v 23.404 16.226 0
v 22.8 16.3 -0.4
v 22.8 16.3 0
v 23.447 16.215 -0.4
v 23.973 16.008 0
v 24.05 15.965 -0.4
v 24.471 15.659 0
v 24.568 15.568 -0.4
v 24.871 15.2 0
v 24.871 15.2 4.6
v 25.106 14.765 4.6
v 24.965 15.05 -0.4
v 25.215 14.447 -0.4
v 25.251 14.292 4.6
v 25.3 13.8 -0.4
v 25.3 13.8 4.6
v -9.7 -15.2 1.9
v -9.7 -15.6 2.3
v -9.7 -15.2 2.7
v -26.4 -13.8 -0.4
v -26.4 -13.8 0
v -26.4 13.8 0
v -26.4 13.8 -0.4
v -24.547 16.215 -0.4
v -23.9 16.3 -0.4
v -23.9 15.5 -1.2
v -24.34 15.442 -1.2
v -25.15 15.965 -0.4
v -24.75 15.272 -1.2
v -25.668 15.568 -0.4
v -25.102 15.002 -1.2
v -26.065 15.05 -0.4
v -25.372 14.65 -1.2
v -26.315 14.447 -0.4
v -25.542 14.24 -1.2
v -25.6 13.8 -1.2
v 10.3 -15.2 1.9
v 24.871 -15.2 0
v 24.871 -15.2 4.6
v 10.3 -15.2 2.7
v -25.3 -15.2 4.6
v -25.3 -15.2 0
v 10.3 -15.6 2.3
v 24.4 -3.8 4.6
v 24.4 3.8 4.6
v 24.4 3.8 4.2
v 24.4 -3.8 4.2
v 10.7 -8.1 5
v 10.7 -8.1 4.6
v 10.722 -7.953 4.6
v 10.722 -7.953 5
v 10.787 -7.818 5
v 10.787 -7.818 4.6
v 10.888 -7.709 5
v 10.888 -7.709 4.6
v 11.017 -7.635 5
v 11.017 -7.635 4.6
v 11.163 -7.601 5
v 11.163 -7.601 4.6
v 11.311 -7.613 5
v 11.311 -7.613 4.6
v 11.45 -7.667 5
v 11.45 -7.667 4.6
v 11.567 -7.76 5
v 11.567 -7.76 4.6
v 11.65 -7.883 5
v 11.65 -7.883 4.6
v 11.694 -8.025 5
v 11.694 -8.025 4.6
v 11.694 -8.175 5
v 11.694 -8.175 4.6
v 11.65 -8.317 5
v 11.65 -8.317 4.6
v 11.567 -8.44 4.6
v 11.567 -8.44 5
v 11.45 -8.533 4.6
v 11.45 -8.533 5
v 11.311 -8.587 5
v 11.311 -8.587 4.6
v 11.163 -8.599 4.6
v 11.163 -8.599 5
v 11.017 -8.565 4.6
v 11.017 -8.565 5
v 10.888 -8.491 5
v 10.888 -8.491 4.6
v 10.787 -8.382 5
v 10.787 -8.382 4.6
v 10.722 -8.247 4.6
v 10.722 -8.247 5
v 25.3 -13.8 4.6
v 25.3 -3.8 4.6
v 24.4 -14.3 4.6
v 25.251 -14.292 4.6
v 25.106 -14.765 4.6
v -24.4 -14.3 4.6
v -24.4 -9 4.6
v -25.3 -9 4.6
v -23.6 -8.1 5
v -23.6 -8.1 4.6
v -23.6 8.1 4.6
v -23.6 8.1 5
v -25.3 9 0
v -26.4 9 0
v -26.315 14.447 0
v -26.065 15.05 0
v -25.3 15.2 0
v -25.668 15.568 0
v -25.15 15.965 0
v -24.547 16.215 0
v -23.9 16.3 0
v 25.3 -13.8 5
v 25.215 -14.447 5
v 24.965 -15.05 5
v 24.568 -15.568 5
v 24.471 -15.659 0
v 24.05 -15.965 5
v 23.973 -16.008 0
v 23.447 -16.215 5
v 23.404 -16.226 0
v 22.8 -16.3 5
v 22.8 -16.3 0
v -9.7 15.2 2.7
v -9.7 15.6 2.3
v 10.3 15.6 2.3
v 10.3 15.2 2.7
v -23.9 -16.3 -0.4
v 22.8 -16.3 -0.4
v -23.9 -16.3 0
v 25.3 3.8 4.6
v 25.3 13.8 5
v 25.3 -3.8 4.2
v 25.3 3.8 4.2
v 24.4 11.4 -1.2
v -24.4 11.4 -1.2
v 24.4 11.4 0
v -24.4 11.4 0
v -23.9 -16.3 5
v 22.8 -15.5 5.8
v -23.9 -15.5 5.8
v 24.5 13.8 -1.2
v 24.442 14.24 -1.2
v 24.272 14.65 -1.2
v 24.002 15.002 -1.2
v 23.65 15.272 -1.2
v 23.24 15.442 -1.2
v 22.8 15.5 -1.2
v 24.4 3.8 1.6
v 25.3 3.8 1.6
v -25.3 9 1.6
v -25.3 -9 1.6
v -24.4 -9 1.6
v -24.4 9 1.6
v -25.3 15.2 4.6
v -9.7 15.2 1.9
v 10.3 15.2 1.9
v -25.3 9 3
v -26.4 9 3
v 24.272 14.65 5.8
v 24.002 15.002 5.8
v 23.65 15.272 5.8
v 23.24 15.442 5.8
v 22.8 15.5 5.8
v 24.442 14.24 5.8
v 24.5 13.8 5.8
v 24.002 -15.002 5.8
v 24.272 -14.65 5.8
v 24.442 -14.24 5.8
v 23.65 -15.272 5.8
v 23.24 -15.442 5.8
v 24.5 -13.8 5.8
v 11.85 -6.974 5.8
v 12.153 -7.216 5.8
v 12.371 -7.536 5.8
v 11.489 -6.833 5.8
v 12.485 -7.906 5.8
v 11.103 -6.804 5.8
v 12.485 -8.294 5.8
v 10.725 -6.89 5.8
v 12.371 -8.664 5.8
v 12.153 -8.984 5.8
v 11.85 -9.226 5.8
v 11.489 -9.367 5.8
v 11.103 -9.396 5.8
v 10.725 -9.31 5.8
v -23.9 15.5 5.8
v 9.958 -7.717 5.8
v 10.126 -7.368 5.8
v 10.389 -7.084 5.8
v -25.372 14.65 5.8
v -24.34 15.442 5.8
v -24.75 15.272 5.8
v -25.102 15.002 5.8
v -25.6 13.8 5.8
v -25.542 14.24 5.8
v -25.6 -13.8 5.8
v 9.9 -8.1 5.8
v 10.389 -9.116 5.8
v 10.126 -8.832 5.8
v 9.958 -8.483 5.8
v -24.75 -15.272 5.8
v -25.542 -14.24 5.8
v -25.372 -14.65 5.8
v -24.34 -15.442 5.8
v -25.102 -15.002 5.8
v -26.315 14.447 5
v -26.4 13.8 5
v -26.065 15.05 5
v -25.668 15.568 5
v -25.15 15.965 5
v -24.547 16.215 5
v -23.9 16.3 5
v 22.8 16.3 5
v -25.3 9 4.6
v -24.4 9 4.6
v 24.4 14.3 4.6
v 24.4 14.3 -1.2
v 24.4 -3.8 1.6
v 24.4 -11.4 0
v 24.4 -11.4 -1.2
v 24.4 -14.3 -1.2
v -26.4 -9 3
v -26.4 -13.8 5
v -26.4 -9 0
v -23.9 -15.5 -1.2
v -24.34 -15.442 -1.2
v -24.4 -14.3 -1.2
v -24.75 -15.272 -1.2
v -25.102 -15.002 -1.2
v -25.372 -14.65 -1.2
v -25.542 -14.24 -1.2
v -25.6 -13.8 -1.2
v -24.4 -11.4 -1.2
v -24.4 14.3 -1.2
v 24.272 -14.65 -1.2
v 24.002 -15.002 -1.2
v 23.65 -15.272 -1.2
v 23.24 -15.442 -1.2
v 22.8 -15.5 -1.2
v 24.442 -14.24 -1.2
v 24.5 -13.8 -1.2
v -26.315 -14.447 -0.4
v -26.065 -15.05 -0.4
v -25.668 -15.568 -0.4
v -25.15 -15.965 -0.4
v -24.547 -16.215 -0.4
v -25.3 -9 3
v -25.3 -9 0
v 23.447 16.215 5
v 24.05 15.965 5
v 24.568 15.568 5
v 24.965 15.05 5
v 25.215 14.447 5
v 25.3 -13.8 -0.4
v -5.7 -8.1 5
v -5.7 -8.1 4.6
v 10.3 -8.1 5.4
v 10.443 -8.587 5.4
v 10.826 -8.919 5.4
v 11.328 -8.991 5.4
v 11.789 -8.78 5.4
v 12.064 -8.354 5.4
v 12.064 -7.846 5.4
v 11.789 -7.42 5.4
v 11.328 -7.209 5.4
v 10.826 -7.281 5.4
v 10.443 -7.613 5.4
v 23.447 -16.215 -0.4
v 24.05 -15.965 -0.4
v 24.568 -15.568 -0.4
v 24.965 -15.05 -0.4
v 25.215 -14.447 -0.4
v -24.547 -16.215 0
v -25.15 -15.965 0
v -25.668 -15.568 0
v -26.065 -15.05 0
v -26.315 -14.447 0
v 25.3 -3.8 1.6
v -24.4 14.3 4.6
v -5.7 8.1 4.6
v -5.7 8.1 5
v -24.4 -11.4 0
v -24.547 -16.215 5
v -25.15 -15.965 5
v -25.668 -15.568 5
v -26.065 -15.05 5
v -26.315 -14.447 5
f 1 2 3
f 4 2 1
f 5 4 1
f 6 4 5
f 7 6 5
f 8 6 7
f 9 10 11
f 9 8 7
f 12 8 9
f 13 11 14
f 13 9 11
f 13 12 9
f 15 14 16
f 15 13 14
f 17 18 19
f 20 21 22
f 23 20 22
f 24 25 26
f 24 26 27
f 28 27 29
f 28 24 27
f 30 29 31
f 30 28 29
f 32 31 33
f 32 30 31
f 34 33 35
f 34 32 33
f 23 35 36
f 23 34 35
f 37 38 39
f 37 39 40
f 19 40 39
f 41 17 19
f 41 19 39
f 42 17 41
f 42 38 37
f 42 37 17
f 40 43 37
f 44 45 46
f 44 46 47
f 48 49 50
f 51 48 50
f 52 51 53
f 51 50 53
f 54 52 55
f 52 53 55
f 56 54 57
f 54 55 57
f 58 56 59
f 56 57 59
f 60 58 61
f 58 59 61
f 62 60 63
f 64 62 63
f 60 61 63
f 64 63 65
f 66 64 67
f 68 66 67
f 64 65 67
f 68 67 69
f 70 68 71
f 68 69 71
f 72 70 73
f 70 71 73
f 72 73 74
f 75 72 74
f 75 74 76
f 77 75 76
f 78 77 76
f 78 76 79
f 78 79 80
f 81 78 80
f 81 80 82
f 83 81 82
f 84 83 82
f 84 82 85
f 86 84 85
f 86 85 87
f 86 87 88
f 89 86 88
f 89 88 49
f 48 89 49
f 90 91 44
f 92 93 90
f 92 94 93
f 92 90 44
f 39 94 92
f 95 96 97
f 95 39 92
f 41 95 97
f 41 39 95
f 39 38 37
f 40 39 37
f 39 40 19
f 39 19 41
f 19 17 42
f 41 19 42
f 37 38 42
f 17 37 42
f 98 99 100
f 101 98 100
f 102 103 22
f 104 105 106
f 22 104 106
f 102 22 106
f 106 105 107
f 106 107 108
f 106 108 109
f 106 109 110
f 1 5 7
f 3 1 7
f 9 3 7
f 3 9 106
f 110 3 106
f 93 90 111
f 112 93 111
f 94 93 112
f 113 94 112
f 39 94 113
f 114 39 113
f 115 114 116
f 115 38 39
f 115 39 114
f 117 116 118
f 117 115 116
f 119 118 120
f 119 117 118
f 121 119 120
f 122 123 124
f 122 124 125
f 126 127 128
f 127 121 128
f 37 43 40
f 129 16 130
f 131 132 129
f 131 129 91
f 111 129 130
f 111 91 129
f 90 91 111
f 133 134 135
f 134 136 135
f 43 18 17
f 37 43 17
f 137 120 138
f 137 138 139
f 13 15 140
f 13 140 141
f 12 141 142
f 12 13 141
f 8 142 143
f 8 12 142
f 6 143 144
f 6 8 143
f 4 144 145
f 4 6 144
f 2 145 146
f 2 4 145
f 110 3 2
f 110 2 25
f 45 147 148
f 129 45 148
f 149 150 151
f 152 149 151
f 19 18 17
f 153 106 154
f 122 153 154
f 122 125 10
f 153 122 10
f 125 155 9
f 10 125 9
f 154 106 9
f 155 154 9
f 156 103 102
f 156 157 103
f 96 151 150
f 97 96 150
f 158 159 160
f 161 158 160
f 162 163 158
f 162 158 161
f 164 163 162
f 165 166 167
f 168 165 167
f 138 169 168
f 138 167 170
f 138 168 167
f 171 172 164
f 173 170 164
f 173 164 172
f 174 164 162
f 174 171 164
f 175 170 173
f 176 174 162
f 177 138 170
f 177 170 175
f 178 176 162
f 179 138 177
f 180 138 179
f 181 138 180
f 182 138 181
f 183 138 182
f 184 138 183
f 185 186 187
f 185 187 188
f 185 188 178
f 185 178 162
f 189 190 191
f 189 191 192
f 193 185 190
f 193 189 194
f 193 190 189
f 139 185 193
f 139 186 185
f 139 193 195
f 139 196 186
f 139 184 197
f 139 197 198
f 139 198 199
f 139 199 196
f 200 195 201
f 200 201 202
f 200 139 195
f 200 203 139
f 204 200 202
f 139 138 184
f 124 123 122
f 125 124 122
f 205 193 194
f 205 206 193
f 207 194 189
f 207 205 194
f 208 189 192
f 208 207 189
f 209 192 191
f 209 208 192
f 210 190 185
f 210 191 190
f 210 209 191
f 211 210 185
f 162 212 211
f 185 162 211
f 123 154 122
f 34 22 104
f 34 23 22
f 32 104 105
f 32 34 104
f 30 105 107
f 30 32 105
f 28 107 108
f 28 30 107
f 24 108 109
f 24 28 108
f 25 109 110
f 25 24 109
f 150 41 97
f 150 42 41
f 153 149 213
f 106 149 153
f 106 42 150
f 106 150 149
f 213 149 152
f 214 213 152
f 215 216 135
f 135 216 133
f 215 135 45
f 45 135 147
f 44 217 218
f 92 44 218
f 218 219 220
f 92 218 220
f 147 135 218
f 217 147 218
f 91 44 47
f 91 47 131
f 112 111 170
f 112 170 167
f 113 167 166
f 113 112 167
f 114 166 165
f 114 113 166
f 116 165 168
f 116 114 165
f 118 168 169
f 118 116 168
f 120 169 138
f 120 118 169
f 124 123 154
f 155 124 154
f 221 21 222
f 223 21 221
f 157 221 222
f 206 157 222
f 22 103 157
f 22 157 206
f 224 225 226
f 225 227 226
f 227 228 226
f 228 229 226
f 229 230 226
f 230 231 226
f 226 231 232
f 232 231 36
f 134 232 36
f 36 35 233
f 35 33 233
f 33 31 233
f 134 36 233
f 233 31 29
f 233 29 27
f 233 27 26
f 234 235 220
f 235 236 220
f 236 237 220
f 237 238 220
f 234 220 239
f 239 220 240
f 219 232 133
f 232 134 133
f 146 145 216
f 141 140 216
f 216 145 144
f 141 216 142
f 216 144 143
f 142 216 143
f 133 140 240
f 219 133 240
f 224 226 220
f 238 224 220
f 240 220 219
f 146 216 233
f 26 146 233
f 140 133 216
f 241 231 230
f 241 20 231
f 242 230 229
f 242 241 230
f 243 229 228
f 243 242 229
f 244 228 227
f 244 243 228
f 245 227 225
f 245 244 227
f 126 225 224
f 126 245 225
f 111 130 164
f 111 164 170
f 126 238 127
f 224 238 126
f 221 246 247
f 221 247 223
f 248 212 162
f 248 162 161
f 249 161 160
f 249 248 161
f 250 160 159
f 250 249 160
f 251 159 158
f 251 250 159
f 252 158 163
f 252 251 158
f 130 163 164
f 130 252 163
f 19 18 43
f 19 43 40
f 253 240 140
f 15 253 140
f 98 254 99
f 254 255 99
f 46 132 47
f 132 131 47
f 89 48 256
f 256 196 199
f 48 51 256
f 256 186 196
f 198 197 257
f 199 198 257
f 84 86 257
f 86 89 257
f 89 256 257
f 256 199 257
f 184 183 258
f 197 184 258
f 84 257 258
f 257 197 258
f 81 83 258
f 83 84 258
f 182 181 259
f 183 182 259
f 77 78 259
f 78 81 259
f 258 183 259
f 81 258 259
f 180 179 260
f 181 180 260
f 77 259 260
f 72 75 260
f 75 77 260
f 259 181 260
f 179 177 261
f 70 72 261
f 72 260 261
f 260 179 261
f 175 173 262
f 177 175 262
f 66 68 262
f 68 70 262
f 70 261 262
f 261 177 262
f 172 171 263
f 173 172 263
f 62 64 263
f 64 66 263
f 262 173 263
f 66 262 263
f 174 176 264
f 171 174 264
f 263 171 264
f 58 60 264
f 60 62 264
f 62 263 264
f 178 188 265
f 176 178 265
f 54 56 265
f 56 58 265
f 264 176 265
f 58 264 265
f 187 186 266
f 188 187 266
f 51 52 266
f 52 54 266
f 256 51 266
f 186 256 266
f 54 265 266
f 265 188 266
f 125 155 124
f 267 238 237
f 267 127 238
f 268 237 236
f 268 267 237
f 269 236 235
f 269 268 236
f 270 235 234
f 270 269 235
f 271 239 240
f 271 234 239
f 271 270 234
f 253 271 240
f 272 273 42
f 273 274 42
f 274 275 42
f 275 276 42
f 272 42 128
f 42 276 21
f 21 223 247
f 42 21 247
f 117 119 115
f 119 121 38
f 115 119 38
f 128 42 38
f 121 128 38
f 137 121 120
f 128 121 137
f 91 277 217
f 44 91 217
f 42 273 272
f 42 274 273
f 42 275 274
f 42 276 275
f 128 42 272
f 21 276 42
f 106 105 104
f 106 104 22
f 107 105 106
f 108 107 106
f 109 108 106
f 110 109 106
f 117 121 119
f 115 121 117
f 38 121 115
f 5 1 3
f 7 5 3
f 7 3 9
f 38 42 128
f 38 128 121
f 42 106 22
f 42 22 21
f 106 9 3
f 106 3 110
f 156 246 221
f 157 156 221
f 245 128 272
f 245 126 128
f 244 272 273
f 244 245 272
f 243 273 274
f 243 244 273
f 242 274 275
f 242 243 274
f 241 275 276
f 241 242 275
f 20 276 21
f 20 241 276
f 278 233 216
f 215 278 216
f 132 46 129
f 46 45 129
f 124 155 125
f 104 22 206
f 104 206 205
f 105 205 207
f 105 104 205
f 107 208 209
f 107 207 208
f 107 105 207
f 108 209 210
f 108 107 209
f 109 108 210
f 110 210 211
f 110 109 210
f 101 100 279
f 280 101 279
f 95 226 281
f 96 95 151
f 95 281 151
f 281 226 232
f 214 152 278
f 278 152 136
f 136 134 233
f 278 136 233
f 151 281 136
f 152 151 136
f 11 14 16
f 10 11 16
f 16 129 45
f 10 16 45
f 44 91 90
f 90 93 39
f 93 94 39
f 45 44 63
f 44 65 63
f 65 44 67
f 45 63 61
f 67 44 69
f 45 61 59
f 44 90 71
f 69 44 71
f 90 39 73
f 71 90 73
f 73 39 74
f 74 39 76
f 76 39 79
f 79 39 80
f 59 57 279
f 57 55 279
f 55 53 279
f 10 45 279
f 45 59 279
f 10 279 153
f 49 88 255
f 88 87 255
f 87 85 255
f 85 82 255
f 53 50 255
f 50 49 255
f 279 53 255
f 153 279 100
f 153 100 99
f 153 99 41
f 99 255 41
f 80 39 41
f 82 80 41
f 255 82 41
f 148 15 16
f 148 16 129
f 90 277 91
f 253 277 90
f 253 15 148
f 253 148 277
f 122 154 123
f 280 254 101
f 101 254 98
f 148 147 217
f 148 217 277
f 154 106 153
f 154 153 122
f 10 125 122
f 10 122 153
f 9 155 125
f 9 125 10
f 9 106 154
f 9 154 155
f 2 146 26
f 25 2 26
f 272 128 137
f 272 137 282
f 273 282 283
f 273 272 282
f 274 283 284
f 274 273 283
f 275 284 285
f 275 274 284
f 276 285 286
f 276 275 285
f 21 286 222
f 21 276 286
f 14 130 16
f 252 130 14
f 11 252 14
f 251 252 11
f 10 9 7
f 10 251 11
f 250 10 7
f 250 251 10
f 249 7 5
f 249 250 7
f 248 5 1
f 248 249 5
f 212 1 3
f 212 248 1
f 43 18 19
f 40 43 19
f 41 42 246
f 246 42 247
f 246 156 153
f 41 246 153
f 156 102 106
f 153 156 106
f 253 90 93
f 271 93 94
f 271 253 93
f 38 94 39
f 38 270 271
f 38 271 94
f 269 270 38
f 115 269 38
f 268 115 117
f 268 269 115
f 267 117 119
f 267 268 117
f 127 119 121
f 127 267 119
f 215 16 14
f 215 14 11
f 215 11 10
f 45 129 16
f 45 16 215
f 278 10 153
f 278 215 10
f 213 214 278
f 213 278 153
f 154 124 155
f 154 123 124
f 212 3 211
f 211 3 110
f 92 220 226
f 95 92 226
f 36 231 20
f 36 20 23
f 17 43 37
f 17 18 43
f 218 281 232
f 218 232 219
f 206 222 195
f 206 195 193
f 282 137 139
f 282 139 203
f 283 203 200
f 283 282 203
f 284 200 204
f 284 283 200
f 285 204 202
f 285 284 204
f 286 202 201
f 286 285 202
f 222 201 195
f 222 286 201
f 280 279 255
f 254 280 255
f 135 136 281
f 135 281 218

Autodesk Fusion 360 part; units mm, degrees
sketch "Board" plane through (0, 0, 0) normal (0, 0, 1) x (1, 0, 0)
  line L0 (-24.2, 14.1) -> (24.2, 14.1)
  line L1 (24.2, 14.1) -> (24.2, -14.1)
  line L2 (24.2, -14.1) -> (-24.2, -14.1)
  line L3 (-24.2, -14.1) -> (-24.2, 14.1)
  line L4 (-24.2, 14.1) -> (24.2, -14.1) construction
  line L5 (24.2, 14.1) -> (-24.2, -14.1) construction
  line L6 (18.3, 3.8) -> (25, 3.8)
  line L7 (25, 3.8) -> (25, -3.8)
  line L8 (25, -3.8) -> (18.3, -3.8)
  line L9 (18.3, -3.8) -> (18.3, 3.8)
  line L10 (-24.2, 0) -> (24.2, 0) construction
  line L11 (-23.4, 7.9) -> (-5.9, 7.9)
  line L12 (-5.9, 7.9) -> (-5.9, -7.9)
  line L13 (-5.9, -7.9) -> (-23.4, -7.9)
  line L14 (-23.4, -7.9) -> (-23.4, 7.9)
  line L15 (-30.2, 9) -> (-23.4, 9)
  line L16 (-23.4, 9) -> (-23.4, -9)
  line L17 (-23.4, -9) -> (-30.2, -9)
  line L18 (-30.2, -9) -> (-30.2, 9)
  line L19 (-24, 14) -> (24, 14)
  line L20 (24, 14) -> (24, 11.6)
  line L21 (24, 11.6) -> (-24, 11.6)
  line L22 (-24, 11.6) -> (-24, 14)
  line L23 (-24, -11.6) -> (24, -11.6)
  line L24 (24, -11.6) -> (24, -14)
  line L25 (24, -14) -> (-24, -14)
  line L26 (-24, -14) -> (-24, -11.6)
  line L27 (10.2, -7.6) -> (12.2, -7.6)
  line L28 (12.2, -7.6) -> (12.2, -8.6)
  line L29 (12.2, -8.6) -> (10.2, -8.6)
  line L30 (10.2, -8.6) -> (10.2, -7.6)
  point P0 (25, 0)
  point P1 (-23.4, 0)
  dimension "d1" = 48.4
  dimension "d2" = 28.2
  dimension "d3" = 7.6
  dimension "d4" = 6.7
  dimension "d5" = 0.8
  dimension "d6" = 17.5
  dimension "d7" = 15.8
  dimension "d8" = 0.8
  dimension "d9" = 18
  dimension "d10" = 6.8
  dimension "d11" = 2.4
  dimension "d12" = 0.1
  dimension "d13" = 0.2
  dimension "d14" = 48
  dimension "d15" = 2.4
  dimension "d16" = 0.1
  dimension "d17" = 0.2
  dimension "d18" = 48
  dimension "d64" = 2
  dimension "d65" = 1
  dimension "d66" = 12
  dimension "d67" = 5.5
sketch "Case" plane through (0, 0, 0) normal (0, 0, 1) x (1, 0, 0)
  line L0 (-24.2, 14.1) -> (24.2, 14.1) construction
  line L1 (24.2, 14.1) -> (24.2, -14.1) construction
  line L2 (24.2, -14.1) -> (-24.2, -14.1) construction
  line L3 (-24.2, -14.1) -> (-24.2, 14.1) construction
  line L4 (24.4, -14.3) -> (-24.4, -14.3)
  line L5 (-24.4, -14.3) -> (-24.4, 14.3)
  line L6 (-24.4, 14.3) -> (24.4, 14.3)
  line L7 (24.4, 14.3) -> (24.4, -14.3)
  line L8 (25.3, -15.2) -> (-25.3, -15.2)
  line L9 (-25.3, -15.2) -> (-25.3, 15.2)
  line L10 (-25.3, 15.2) -> (25.3, 15.2)
  line L11 (25.3, 15.2) -> (25.3, -15.2)
  line L12 (26.4, -16.3) -> (-26.4, -16.3) construction
  line L13 (-26.4, -16.3) -> (-26.4, 16.3)
  line L14 (-26.4, 16.3) -> (26.4, 16.3) construction
  line L15 (26.4, 16.3) -> (26.4, -16.3) construction
  line L16 (25.3, 15.2) -> (25.3, 16.3)
  line L17 (25.3, -15.2) -> (25.3, -16.3)
  line L18 (25.3, 16.3) -> (-26.4, 16.3)
  line L19 (25.3, -16.3) -> (-26.4, -16.3)
  line L20 (24, 11.6) -> (-24, 11.6) construction
  line L21 (-24, -11.6) -> (24, -11.6) construction
  line L22 (-24.4, -11.4) -> (24.4, -11.4)
  line L23 (-24.4, 11.4) -> (24.4, 11.4)
  dimension "d26" = 0.2
  dimension "d27" = 0.2
extrude "Extrude1" add sketch "Case" against normal blind 1.2 contours L5 L7 L22 L23 | L8 L9 L10 L13 L16 L17 L18 L19 | L8 L9 L10 L11 makes body 1 in component "Base"
extrude "Extrude2" add sketch "Case" along normal blind 1.6 contours L8 L9 L10 L11 bodies 1 in component "Base"
sketch "Sketch3" plane through (0, 0, 1.6) normal (0, 0, 1) x (-1, 0, 0) in component "Base"
  line L0 (24.4, -14.3) -> (-24.4, -14.3)
  line L1 (-24.4, -14.3) -> (-24.4, 14.3)
  line L2 (-24.4, 14.3) -> (24.4, 14.3)
  line L3 (24.4, 14.3) -> (24.4, -14.3)
  line L4 (-25.3, -15.2) -> (25.3, -15.2)
  line L5 (25.3, -15.2) -> (25.3, 15.2)
  line L6 (25.3, 15.2) -> (-25.3, 15.2)
  line L7 (-25.3, 15.2) -> (-25.3, -15.2)
  line L8 (-18.3, -3.8) -> (-25, -3.8)
  line L9 (-25, 3.8) -> (-18.3, 3.8)
  line L10 (-25.3, -15.2) -> (-25.3, 15.2)
  line L11 (-24.4, -14.3) -> (-24.4, 14.3)
  line L12 (24.4, -14.3) -> (-24.4, -14.3)
  line L13 (25.3, -15.2) -> (-25.3, -15.2)
  line L14 (24.4, 14.3) -> (24.4, -14.3)
  line L15 (25.3, 15.2) -> (25.3, -15.2)
  line L16 (-24.4, 14.3) -> (24.4, 14.3)
  line L17 (-25.3, 15.2) -> (25.3, 15.2)
  line L18 (-24.4, -3.8) -> (-25.3, -3.8)
  line L19 (-24.4, 3.8) -> (-25.3, 3.8)
  line L20 (30.2, -9) -> (23.4, -9)
  line L21 (23.4, 9) -> (30.2, 9)
extrude "Extrude5" add sketch "Sketch3" along normal blind 3 contours L0 L1 L3 L4 L5 L7 L8 L10 L11 L12 L13 L14 L15 L18 L20 | L1 L2 L3 L5 L6 L7 L9 L10 L11 L14 L15 L16 L17 L19 L21 bodies 1 in component "Base"
fillet "Fillet1" radius 2.5 4 edges at (25.3, -16.3, -0.6) (25.3, 16.3, -0.6) (-26.4, -16.3, -0.6) (-26.4, 16.3, -0.6) on bodies 1 in component "Base"
chamfer "Chamfer1" distance 0.8 angle 45 8 edges at (25.3, 0, -1.2) (24.5678, -15.5678, -1.2) (-0.55, -16.3, -1.2) (-25.6678, -15.5678, -1.2) (-26.4, 0, -1.2) (-25.6678, 15.5678, -1.2) (-0.55, 16.3, -1.2) (24.5678, 15.5678, -1.2) on bodies 1 in component "Base"
sketch "Sketch4" plane through (25.3, 0, 0) normal (1, 0, 0) x (0, 1, 0)
  line L0 (-13.8, -0.4) -> (13.8, -0.4)
  line L1 (13.8, -0.4) -> (13.8, 4.6)
  line L2 (13.8, 4.6) -> (3.8, 4.6)
  line L3 (3.8, 4.6) -> (3.8, 1.6)
  line L4 (3.8, 1.6) -> (-3.8, 1.6)
  line L5 (-3.8, 1.6) -> (-3.8, 4.6)
  line L6 (-3.8, 4.6) -> (-13.8, 4.6)
  line L7 (-13.8, 4.6) -> (-13.8, -0.4)
  line L8 (-15.2, 4.6) -> (-15.2, 0)
  line L9 (-15.2, 2.3) -> (-15.6, 2.3) construction
  line L10 (-15.6, 2.3) -> (-15.2, 1.9)
  line L11 (-15.6, 2.3) -> (-15.2, 2.7)
  line L12 (-15.2, 2.7) -> (-15.2, 1.9)
  line L13 (15.2, 0) -> (15.2, 4.6)
  line L14 (15.2, 2.3) -> (15.6, 2.3) construction
  line L15 (15.6, 2.3) -> (15.2, 1.9)
  line L16 (15.6, 2.3) -> (15.2, 2.7)
  line L17 (15.2, 2.7) -> (15.2, 1.9)
extrude "Extrude6" add sketch "Sketch4" along normal blind -15 and the other way blind 35 contours L8 L10 L11 L12 | L13 L15 L16 L17 bodies 1 in component "Base"
extrude "Extrude1'" add sketch "Case" along normal blind 4.6 separate body contours L8 L9 L10 L13 L16 L17 L18 L19 makes body 2 in component "Lid"
sketch "Sketch1" plane through (0, 0, 4.6) normal (0, 0, 1) x (-1, 0, 0) in component "Lid"
  line L0 (-25.3, 15.2) -> (25.3, 15.2)
  line L1 (25.3, 15.2) -> (25.3, -15.2)
  line L2 (25.3, -15.2) -> (-25.3, -15.2)
  line L3 (-25.3, -15.2) -> (-25.3, -16.3)
  line L4 (-25.3, -16.3) -> (26.4, -16.3)
  line L5 (26.4, -16.3) -> (26.4, 16.3)
  line L6 (26.4, 16.3) -> (-25.3, 16.3)
  line L7 (-25.3, 16.3) -> (-25.3, 15.2)
  line L8 (26.4, -16.3) -> (-25.3, -16.3)
  line L9 (-25.3, -16.3) -> (-25.3, 16.3)
  line L10 (-25.3, 16.3) -> (26.4, 16.3)
  line L11 (26.4, 16.3) -> (26.4, -16.3)
  line L12 (25.3, 15.2) -> (25.3, -15.2)
  line L13 (-24.4, -14.3) -> (-24.4, 14.3)
  line L14 (-24.4, -3.8) -> (-25.3, -3.8)
  line L15 (-24.4, 3.8) -> (-25.3, 3.8)
  line L16 (30.2, -9) -> (23.4, -9)
  line L17 (23.4, 9) -> (30.2, 9)
  line L18 (-12.2, 8.6) -> (-10.2, 8.6)
  line L19 (-10.2, 7.6) -> (-12.2, 7.6)
  line L20 (-10.2, 8.6) -> (-10.2, 7.6)
  line L21 (-12.2, 7.6) -> (-12.2, 8.6)
  line L22 (-10.2, 7.6) -> (-12.2, 8.6) construction
  line L23 (-10.2, 8.6) -> (-12.2, 7.6) construction
  circle A0 centre (-11.2, 8.1) radius 0.5
  line L24 (23.4, -7.9) -> (5.9, -7.9) construction
  line L25 (5.9, -7.9) -> (5.9, 7.9) construction
  line L26 (5.9, 7.9) -> (23.4, 7.9) construction
  line L27 (23.4, 7.9) -> (23.4, -7.9) construction
  line L28 (23.6, -8.1) -> (5.7, -8.1)
  line L29 (5.7, -8.1) -> (5.7, 8.1)
  line L30 (5.7, 8.1) -> (23.6, 8.1)
  line L31 (23.6, 8.1) -> (23.6, -8.1)
  point P0 (23.4, -7.9)
  point P1 (5.9, 7.9)
extrude "Extrude2'" cut sketch "Sketch1" along normal blind -4.6 and the other way blind 1.6 contours L1 L5 L11 L12 L16 L17 bodies 2 in component "Lid"
extrude "Extrude3" add sketch "Sketch1" along normal blind 1.2 contours L0 L1 L5 L6 L7 L9 L10 L11 L12 L17 | L0 L1 L2 L9 L12 L13 L14 L15 | L9 L13 L14 L15 | L1 L5 L11 L12 L16 L17 | L1 L2 L3 L4 L5 L8 L9 L11 L12 L16 | L18 L19 L21 A0 | L18 L19 L20 A0 | A0 | L28 L29 L30 L31 bodies 2 in component "Lid"
extrude "Extrude4" add sketch "Sketch1" against normal blind 0.4 contours L9 L13 L14 L15 bodies 2 in component "Lid"
fillet "Fillet1'" radius 2.5 4 edges at (25.3, -16.3, 2.9) (25.3, 16.3, 2.9) (-26.4, -16.3, 2.9) (-26.4, 16.3, 2.9) on bodies 2 in component "Lid"
chamfer "Chamfer1'" distance 0.8 angle 45 8 edges at (-0.55, 16.3, 5.8) (-25.6678, 15.5678, 5.8) (-26.4, 0, 5.8) (-25.6678, -15.5678, 5.8) (-0.55, -16.3, 5.8) (24.5678, -15.5678, 5.8) (25.3, 0, 5.8) (24.5678, 15.5678, 5.8) on bodies 2 in component "Lid"
extrude "Extrude5'" cut sketch "Sketch4" along normal blind -15 and the other way blind 35 contours L8 L10 L11 L12 | L13 L15 L16 L17 bodies 2 in component "Lid"
extrude "Extrude6'" cut sketch "Sketch1" along normal blind 1.2 contours A0 bodies 2 in component "Lid"
chamfer "Chamfer2" distance 0.8 angle 45 1 edges at (11.6662, -8.2808, 5.8) on bodies 2 in component "Lid"
extrude "Extrude7" cut sketch "Sketch1" along normal blind 0.4 contours L28 L29 L30 L31 bodies 2 in component "Lid"
component "Base" placed x (1, 0, 0) y (0, 1, 0) z (0, 0, 1) at (0, 0, 0)
component "Lid" placed x (1, 0, 0) y (0, 1, 0) z (0, 0, 1) at (0, 0, 0)
equation "d19 = -fit_tollerance"
equation "inner_wall_thickness = 0.9 mm"
equation "outer_wall_thickness = 1.1 mm"
equation "base_thickness = 1.2 mm"
equation "fit_tollerance = 0.2 mm"
equation "d24 = -fit_tollerance - inner_wall_thickness"
equation "d25 = -fit_tollerance - inner_wall_thickness - outer_wall_thickness"
equation "d26 = fit_tollerance"
equation "d27 = fit_tollerance"
equation "d28 = -base_thickness"
equation "board_thickness = 1.6 mm"
equation "componnet_thickness = 3 mm"
equation "d32 = board_thickness"
equation "d38 = componnet_thickness"
equation "d43 = board_thickness + componnet_thickness"
equation "d45 = -componnet_thickness - board_thickness"
equation "d47 = componnet_thickness - 1.4 mm"
equation "d49 = base_thickness"
equation "d68 = base_thickness"
equation "d71 = -fit_tollerance"
